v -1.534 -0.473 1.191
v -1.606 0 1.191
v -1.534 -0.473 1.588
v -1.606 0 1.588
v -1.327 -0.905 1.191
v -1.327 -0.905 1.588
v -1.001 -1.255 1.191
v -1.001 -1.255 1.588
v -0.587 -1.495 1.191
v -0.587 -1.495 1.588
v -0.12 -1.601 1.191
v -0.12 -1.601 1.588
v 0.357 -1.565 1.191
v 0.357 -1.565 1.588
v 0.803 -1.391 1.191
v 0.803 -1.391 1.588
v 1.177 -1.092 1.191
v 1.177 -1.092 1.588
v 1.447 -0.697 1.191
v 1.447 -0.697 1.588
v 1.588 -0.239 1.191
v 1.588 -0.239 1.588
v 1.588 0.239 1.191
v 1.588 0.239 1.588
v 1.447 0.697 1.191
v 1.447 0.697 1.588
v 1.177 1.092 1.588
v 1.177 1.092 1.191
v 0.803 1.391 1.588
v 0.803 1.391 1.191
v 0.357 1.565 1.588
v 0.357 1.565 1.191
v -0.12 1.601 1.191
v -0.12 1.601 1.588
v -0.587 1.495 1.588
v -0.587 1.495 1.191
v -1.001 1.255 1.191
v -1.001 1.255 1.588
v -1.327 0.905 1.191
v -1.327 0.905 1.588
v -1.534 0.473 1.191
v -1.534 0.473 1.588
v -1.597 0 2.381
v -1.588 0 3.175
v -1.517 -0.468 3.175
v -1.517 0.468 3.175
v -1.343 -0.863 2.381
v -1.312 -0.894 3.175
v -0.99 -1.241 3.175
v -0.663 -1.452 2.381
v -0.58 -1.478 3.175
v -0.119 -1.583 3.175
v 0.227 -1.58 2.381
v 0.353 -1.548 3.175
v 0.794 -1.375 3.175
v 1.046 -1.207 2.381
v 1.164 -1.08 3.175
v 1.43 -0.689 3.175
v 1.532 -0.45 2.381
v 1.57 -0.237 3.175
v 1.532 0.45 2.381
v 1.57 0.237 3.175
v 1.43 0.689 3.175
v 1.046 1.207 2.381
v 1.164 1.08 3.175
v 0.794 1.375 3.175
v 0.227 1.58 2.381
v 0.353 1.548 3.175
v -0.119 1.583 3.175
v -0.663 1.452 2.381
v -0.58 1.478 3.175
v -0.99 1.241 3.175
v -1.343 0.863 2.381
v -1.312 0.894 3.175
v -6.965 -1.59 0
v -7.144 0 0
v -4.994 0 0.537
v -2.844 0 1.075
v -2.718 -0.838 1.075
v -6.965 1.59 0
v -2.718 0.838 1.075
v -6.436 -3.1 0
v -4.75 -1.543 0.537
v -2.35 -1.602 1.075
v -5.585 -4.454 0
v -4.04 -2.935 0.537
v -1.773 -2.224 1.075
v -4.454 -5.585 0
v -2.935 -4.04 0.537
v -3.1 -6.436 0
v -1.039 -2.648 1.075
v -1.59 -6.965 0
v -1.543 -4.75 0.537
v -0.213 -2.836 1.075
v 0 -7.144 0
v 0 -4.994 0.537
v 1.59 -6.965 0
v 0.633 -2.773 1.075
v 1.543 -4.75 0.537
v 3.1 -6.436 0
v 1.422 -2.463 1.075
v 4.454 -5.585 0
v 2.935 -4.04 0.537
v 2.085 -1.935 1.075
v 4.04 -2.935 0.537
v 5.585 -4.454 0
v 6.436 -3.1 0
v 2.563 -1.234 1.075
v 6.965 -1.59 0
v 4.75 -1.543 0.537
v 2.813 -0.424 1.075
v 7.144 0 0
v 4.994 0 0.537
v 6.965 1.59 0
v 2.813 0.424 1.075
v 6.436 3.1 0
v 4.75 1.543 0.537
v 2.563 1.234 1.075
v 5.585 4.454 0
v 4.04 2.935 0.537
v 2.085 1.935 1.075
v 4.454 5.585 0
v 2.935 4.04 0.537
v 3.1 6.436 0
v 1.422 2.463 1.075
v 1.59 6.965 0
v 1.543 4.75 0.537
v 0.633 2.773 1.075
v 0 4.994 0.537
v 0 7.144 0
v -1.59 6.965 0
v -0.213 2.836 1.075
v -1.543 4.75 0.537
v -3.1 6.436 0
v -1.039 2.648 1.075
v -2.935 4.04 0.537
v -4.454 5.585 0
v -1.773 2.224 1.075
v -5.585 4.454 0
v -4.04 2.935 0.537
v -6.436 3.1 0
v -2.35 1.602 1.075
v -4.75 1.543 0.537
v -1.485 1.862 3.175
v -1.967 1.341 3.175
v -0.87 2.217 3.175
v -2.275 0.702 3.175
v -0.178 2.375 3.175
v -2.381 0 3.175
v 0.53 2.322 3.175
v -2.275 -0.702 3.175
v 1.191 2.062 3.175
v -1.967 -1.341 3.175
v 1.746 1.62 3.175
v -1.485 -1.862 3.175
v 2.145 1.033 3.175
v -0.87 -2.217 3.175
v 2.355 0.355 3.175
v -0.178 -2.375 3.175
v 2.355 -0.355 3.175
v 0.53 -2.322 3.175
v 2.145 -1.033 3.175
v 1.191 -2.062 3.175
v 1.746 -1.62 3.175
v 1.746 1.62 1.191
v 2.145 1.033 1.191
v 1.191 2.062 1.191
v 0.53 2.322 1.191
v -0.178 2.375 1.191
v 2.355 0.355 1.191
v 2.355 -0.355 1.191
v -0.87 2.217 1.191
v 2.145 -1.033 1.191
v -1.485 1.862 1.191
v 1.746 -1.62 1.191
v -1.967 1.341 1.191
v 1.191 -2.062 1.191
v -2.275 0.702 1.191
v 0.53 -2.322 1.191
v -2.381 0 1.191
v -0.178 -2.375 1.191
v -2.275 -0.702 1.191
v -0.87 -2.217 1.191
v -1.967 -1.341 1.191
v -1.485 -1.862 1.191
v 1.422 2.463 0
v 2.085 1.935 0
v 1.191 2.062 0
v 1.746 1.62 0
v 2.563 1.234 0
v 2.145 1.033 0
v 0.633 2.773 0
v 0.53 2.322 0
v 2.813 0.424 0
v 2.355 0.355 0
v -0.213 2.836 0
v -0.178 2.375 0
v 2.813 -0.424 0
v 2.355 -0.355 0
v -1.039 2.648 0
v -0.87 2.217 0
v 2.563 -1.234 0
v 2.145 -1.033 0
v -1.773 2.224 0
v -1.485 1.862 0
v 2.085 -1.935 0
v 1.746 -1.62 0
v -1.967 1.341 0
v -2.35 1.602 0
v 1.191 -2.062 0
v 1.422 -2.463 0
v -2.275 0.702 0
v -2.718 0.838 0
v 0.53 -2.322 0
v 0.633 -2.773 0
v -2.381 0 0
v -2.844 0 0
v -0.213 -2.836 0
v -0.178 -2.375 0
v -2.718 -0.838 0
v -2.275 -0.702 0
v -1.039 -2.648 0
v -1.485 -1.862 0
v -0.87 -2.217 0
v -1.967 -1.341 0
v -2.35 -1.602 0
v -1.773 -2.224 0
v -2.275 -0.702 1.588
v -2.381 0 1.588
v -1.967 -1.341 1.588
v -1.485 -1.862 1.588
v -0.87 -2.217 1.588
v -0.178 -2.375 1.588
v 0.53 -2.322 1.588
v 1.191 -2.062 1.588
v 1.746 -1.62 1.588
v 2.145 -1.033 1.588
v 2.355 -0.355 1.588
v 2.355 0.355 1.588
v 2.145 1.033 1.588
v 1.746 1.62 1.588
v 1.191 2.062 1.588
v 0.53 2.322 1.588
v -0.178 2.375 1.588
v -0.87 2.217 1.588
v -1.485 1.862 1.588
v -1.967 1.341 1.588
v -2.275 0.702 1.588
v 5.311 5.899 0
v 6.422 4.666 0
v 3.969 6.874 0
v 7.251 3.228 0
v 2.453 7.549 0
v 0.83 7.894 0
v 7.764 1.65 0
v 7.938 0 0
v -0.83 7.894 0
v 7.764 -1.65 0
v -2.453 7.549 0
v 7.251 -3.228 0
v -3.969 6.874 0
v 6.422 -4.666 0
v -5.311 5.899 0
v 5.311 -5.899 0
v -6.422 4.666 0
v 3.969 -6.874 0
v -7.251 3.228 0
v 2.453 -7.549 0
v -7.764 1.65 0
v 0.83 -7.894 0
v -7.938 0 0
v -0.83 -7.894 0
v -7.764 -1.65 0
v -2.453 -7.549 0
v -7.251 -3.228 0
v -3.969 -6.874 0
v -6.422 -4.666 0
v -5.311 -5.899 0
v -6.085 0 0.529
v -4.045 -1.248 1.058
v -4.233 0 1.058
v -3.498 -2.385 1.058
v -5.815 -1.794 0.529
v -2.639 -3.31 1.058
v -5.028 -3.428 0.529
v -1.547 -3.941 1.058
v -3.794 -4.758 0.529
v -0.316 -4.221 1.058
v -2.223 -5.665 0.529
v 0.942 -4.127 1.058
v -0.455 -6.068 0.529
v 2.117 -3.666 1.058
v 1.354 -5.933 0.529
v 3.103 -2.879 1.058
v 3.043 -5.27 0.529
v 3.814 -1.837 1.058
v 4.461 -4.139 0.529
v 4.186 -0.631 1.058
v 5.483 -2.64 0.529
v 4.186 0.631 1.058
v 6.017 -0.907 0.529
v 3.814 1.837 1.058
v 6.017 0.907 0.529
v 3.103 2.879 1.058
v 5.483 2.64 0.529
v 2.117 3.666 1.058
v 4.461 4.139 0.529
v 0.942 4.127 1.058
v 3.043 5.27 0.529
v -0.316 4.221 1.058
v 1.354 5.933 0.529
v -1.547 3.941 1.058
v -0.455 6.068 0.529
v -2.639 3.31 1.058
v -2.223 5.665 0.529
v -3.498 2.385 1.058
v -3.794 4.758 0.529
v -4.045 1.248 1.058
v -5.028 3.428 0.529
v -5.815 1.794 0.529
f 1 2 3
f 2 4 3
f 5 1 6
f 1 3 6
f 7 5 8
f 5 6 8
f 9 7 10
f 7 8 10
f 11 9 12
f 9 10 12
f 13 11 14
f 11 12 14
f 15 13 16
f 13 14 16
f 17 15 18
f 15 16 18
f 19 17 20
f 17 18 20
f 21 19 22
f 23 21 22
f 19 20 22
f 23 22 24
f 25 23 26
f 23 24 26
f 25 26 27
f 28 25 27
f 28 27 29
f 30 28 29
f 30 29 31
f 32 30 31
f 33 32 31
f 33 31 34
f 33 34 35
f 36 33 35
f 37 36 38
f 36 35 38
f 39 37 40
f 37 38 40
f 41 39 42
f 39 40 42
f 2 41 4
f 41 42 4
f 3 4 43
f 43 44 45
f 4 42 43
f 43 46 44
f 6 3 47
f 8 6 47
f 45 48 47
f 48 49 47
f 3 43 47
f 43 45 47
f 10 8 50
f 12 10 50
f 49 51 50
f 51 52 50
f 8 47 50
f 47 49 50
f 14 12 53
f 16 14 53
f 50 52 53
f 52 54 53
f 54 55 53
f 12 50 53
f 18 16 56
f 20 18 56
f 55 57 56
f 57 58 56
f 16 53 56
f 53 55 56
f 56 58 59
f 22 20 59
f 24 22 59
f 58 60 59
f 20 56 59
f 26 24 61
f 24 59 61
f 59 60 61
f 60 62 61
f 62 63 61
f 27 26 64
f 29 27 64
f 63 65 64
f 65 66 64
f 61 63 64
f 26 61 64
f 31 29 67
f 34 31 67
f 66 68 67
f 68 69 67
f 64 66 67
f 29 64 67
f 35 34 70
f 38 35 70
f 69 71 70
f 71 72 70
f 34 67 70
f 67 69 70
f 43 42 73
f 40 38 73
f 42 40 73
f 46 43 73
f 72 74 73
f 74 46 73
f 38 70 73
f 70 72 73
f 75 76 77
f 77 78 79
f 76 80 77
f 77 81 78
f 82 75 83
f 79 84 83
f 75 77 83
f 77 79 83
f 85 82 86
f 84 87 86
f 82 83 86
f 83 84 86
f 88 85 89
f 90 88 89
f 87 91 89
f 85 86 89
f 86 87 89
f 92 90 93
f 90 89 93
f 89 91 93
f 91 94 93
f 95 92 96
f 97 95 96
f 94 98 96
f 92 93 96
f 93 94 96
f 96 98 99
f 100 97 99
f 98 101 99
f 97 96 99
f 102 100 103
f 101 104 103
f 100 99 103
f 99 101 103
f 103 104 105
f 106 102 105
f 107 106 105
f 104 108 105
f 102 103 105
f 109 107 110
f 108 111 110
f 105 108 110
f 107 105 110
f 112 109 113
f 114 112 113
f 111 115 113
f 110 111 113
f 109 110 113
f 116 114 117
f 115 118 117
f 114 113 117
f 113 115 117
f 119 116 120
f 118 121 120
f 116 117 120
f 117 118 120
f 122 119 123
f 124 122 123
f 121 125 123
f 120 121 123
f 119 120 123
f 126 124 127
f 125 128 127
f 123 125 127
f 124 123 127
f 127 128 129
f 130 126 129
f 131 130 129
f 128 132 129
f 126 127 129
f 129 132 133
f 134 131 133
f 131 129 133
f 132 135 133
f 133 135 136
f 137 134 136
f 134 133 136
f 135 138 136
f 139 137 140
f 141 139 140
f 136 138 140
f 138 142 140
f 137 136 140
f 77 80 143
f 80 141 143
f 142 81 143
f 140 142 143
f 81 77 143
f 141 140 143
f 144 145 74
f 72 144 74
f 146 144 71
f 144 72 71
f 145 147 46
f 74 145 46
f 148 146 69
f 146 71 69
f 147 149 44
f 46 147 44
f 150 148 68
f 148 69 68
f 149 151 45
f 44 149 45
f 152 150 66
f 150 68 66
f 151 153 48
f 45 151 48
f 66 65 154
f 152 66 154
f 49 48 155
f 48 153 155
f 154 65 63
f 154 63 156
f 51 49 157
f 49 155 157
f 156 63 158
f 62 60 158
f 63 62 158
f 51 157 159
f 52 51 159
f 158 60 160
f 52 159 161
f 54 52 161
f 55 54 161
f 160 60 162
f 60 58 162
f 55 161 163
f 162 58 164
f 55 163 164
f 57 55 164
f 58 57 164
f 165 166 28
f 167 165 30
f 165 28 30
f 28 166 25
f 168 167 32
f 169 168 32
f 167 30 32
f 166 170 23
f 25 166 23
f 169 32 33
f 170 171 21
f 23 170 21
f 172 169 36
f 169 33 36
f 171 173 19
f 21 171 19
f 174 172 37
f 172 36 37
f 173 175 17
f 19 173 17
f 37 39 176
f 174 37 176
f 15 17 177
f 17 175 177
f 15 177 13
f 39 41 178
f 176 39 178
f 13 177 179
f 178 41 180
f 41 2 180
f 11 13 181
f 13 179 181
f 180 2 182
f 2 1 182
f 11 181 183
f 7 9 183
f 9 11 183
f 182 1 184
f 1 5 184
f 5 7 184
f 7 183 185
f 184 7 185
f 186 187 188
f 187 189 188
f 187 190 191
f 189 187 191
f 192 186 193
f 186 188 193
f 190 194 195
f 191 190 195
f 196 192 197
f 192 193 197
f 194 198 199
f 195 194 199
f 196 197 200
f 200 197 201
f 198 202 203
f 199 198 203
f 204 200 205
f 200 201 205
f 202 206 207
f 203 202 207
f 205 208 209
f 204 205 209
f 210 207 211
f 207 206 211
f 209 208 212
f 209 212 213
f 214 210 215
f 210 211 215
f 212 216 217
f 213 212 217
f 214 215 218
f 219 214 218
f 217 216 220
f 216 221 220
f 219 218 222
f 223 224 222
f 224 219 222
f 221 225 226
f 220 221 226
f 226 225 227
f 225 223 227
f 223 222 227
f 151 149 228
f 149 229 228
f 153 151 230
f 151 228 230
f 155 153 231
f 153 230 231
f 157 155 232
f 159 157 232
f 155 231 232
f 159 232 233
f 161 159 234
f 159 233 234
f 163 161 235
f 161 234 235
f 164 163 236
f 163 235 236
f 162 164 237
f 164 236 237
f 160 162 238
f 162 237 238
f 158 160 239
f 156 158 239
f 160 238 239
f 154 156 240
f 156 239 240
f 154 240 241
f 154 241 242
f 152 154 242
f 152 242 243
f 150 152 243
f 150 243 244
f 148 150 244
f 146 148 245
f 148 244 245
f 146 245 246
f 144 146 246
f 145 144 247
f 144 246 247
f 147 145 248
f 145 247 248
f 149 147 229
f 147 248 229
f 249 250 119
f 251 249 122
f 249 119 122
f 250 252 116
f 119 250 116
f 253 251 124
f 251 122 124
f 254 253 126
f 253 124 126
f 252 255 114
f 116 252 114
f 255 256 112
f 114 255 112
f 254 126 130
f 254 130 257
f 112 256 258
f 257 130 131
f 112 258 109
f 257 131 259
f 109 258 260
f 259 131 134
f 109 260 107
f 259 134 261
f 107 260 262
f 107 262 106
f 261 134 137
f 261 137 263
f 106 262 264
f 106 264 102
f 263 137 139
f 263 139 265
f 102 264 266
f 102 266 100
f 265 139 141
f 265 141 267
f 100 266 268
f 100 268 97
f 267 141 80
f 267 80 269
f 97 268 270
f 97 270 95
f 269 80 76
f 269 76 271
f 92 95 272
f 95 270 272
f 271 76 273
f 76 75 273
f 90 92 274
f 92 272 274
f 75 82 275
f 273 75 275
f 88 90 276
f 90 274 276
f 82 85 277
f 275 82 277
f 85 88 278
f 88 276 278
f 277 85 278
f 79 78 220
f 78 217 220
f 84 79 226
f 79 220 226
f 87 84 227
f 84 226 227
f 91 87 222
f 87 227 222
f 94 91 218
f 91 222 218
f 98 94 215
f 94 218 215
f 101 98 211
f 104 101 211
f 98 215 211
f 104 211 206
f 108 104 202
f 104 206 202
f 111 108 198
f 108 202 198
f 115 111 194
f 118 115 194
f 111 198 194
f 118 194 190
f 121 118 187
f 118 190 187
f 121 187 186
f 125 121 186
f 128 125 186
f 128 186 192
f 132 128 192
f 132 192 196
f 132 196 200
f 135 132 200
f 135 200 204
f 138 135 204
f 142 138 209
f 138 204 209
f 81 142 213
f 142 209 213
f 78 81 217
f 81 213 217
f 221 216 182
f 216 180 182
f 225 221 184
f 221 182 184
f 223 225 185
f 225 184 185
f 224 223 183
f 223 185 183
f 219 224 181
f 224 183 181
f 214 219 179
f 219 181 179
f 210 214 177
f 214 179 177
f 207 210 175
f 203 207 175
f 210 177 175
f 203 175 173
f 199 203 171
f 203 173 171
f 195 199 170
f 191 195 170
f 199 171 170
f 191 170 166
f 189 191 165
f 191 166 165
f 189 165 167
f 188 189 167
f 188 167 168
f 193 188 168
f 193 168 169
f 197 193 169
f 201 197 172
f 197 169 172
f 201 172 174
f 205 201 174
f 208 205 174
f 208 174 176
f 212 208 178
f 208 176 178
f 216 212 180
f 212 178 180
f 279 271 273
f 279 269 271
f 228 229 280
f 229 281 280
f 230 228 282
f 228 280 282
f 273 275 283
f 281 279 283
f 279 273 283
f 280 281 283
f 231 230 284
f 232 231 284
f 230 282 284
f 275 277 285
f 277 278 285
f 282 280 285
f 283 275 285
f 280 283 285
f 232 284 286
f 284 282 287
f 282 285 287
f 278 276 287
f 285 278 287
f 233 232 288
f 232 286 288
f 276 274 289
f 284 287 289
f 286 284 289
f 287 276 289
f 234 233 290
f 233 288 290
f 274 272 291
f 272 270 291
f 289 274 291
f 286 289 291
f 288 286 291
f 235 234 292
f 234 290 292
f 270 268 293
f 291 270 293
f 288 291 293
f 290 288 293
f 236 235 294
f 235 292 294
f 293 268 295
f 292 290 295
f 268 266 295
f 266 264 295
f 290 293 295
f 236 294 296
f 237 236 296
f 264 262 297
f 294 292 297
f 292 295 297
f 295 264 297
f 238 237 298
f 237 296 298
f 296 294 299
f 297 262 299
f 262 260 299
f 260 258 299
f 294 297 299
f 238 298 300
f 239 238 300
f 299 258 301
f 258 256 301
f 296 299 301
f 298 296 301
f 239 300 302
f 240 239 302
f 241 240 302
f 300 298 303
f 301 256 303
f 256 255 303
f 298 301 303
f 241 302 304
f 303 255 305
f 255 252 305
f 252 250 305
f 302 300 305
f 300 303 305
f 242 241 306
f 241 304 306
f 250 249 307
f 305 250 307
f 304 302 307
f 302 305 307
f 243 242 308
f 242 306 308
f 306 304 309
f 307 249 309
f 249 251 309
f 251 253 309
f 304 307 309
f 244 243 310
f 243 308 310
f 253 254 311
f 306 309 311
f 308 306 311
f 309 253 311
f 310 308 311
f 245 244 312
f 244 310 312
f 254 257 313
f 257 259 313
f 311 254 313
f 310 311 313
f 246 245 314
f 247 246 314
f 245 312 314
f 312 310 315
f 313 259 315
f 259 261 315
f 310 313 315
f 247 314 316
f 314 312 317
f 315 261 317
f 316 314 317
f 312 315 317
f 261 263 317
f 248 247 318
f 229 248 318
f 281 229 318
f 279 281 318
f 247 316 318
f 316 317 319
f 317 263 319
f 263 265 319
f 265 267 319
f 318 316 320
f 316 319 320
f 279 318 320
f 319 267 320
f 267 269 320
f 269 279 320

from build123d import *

# Parameters (mm, degrees)
F0_W = 0.775582
F0_H = 0.396875


with BuildPart() as f1:
    # F0 (on Front) → F1 (revolve)
    with BuildSketch(Plane.XZ):
        Polygon((-2.844283, 0), (-2.38125, 0), (-2.38125, 1.190625), (-2.844283, 1.074867), align=None)
        Polygon((-2.844283, 1.074867), (-2.38125, 1.190625), (-2.38125, 1.5875), (-7.9375, 0), (-7.14375, 0), align=None)
        with Locations((-1.993459, 1.389063)):
            Rectangle(F0_W, F0_H)
        Polygon((-2.38125, 1.5875), (-1.605668, 1.5875), (-1.5875, 3.175), (-2.38125, 3.175), align=None)
    revolve(axis=Axis((0, 0, 0.79375), (0, 0, 1)))


solid = f1.part
